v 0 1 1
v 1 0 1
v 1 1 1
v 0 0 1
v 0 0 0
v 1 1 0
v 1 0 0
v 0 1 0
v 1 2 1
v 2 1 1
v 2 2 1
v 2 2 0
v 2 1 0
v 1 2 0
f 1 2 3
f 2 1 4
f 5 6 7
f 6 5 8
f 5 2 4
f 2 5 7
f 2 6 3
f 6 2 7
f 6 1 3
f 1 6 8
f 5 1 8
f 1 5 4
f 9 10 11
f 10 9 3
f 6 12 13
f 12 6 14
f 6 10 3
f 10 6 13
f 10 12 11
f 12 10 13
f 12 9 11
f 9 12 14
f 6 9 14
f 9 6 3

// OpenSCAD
polyhedron(
  points=[
    [0, 0, 0],
    [1, 0, 0],
    [0, 1, 0],
    [1, 1, 0],
    [0, 0, 1],
    [1, 0, 1],
    [0, 1, 1],
    [1, 1, 1],

    [2, 1, 0],
    [1, 2, 0],
    [2, 2, 0],
    [2, 1, 1],
    [1, 2, 1],
    [2, 2, 1],
  ],
  faces=[
    [6,7,5,4],
    [0,1,3,2],
    [4,5,1,0],
    [5,7,3,1],
    [7,6,2,3],
    [6,4,0,2],
    [12,13,11,7],
    [3,8,10,9],
    [7,11,8,3],
    [11,13,10,8],
    [13,12,9,10],
    [12,7,3,9],
  ]);
